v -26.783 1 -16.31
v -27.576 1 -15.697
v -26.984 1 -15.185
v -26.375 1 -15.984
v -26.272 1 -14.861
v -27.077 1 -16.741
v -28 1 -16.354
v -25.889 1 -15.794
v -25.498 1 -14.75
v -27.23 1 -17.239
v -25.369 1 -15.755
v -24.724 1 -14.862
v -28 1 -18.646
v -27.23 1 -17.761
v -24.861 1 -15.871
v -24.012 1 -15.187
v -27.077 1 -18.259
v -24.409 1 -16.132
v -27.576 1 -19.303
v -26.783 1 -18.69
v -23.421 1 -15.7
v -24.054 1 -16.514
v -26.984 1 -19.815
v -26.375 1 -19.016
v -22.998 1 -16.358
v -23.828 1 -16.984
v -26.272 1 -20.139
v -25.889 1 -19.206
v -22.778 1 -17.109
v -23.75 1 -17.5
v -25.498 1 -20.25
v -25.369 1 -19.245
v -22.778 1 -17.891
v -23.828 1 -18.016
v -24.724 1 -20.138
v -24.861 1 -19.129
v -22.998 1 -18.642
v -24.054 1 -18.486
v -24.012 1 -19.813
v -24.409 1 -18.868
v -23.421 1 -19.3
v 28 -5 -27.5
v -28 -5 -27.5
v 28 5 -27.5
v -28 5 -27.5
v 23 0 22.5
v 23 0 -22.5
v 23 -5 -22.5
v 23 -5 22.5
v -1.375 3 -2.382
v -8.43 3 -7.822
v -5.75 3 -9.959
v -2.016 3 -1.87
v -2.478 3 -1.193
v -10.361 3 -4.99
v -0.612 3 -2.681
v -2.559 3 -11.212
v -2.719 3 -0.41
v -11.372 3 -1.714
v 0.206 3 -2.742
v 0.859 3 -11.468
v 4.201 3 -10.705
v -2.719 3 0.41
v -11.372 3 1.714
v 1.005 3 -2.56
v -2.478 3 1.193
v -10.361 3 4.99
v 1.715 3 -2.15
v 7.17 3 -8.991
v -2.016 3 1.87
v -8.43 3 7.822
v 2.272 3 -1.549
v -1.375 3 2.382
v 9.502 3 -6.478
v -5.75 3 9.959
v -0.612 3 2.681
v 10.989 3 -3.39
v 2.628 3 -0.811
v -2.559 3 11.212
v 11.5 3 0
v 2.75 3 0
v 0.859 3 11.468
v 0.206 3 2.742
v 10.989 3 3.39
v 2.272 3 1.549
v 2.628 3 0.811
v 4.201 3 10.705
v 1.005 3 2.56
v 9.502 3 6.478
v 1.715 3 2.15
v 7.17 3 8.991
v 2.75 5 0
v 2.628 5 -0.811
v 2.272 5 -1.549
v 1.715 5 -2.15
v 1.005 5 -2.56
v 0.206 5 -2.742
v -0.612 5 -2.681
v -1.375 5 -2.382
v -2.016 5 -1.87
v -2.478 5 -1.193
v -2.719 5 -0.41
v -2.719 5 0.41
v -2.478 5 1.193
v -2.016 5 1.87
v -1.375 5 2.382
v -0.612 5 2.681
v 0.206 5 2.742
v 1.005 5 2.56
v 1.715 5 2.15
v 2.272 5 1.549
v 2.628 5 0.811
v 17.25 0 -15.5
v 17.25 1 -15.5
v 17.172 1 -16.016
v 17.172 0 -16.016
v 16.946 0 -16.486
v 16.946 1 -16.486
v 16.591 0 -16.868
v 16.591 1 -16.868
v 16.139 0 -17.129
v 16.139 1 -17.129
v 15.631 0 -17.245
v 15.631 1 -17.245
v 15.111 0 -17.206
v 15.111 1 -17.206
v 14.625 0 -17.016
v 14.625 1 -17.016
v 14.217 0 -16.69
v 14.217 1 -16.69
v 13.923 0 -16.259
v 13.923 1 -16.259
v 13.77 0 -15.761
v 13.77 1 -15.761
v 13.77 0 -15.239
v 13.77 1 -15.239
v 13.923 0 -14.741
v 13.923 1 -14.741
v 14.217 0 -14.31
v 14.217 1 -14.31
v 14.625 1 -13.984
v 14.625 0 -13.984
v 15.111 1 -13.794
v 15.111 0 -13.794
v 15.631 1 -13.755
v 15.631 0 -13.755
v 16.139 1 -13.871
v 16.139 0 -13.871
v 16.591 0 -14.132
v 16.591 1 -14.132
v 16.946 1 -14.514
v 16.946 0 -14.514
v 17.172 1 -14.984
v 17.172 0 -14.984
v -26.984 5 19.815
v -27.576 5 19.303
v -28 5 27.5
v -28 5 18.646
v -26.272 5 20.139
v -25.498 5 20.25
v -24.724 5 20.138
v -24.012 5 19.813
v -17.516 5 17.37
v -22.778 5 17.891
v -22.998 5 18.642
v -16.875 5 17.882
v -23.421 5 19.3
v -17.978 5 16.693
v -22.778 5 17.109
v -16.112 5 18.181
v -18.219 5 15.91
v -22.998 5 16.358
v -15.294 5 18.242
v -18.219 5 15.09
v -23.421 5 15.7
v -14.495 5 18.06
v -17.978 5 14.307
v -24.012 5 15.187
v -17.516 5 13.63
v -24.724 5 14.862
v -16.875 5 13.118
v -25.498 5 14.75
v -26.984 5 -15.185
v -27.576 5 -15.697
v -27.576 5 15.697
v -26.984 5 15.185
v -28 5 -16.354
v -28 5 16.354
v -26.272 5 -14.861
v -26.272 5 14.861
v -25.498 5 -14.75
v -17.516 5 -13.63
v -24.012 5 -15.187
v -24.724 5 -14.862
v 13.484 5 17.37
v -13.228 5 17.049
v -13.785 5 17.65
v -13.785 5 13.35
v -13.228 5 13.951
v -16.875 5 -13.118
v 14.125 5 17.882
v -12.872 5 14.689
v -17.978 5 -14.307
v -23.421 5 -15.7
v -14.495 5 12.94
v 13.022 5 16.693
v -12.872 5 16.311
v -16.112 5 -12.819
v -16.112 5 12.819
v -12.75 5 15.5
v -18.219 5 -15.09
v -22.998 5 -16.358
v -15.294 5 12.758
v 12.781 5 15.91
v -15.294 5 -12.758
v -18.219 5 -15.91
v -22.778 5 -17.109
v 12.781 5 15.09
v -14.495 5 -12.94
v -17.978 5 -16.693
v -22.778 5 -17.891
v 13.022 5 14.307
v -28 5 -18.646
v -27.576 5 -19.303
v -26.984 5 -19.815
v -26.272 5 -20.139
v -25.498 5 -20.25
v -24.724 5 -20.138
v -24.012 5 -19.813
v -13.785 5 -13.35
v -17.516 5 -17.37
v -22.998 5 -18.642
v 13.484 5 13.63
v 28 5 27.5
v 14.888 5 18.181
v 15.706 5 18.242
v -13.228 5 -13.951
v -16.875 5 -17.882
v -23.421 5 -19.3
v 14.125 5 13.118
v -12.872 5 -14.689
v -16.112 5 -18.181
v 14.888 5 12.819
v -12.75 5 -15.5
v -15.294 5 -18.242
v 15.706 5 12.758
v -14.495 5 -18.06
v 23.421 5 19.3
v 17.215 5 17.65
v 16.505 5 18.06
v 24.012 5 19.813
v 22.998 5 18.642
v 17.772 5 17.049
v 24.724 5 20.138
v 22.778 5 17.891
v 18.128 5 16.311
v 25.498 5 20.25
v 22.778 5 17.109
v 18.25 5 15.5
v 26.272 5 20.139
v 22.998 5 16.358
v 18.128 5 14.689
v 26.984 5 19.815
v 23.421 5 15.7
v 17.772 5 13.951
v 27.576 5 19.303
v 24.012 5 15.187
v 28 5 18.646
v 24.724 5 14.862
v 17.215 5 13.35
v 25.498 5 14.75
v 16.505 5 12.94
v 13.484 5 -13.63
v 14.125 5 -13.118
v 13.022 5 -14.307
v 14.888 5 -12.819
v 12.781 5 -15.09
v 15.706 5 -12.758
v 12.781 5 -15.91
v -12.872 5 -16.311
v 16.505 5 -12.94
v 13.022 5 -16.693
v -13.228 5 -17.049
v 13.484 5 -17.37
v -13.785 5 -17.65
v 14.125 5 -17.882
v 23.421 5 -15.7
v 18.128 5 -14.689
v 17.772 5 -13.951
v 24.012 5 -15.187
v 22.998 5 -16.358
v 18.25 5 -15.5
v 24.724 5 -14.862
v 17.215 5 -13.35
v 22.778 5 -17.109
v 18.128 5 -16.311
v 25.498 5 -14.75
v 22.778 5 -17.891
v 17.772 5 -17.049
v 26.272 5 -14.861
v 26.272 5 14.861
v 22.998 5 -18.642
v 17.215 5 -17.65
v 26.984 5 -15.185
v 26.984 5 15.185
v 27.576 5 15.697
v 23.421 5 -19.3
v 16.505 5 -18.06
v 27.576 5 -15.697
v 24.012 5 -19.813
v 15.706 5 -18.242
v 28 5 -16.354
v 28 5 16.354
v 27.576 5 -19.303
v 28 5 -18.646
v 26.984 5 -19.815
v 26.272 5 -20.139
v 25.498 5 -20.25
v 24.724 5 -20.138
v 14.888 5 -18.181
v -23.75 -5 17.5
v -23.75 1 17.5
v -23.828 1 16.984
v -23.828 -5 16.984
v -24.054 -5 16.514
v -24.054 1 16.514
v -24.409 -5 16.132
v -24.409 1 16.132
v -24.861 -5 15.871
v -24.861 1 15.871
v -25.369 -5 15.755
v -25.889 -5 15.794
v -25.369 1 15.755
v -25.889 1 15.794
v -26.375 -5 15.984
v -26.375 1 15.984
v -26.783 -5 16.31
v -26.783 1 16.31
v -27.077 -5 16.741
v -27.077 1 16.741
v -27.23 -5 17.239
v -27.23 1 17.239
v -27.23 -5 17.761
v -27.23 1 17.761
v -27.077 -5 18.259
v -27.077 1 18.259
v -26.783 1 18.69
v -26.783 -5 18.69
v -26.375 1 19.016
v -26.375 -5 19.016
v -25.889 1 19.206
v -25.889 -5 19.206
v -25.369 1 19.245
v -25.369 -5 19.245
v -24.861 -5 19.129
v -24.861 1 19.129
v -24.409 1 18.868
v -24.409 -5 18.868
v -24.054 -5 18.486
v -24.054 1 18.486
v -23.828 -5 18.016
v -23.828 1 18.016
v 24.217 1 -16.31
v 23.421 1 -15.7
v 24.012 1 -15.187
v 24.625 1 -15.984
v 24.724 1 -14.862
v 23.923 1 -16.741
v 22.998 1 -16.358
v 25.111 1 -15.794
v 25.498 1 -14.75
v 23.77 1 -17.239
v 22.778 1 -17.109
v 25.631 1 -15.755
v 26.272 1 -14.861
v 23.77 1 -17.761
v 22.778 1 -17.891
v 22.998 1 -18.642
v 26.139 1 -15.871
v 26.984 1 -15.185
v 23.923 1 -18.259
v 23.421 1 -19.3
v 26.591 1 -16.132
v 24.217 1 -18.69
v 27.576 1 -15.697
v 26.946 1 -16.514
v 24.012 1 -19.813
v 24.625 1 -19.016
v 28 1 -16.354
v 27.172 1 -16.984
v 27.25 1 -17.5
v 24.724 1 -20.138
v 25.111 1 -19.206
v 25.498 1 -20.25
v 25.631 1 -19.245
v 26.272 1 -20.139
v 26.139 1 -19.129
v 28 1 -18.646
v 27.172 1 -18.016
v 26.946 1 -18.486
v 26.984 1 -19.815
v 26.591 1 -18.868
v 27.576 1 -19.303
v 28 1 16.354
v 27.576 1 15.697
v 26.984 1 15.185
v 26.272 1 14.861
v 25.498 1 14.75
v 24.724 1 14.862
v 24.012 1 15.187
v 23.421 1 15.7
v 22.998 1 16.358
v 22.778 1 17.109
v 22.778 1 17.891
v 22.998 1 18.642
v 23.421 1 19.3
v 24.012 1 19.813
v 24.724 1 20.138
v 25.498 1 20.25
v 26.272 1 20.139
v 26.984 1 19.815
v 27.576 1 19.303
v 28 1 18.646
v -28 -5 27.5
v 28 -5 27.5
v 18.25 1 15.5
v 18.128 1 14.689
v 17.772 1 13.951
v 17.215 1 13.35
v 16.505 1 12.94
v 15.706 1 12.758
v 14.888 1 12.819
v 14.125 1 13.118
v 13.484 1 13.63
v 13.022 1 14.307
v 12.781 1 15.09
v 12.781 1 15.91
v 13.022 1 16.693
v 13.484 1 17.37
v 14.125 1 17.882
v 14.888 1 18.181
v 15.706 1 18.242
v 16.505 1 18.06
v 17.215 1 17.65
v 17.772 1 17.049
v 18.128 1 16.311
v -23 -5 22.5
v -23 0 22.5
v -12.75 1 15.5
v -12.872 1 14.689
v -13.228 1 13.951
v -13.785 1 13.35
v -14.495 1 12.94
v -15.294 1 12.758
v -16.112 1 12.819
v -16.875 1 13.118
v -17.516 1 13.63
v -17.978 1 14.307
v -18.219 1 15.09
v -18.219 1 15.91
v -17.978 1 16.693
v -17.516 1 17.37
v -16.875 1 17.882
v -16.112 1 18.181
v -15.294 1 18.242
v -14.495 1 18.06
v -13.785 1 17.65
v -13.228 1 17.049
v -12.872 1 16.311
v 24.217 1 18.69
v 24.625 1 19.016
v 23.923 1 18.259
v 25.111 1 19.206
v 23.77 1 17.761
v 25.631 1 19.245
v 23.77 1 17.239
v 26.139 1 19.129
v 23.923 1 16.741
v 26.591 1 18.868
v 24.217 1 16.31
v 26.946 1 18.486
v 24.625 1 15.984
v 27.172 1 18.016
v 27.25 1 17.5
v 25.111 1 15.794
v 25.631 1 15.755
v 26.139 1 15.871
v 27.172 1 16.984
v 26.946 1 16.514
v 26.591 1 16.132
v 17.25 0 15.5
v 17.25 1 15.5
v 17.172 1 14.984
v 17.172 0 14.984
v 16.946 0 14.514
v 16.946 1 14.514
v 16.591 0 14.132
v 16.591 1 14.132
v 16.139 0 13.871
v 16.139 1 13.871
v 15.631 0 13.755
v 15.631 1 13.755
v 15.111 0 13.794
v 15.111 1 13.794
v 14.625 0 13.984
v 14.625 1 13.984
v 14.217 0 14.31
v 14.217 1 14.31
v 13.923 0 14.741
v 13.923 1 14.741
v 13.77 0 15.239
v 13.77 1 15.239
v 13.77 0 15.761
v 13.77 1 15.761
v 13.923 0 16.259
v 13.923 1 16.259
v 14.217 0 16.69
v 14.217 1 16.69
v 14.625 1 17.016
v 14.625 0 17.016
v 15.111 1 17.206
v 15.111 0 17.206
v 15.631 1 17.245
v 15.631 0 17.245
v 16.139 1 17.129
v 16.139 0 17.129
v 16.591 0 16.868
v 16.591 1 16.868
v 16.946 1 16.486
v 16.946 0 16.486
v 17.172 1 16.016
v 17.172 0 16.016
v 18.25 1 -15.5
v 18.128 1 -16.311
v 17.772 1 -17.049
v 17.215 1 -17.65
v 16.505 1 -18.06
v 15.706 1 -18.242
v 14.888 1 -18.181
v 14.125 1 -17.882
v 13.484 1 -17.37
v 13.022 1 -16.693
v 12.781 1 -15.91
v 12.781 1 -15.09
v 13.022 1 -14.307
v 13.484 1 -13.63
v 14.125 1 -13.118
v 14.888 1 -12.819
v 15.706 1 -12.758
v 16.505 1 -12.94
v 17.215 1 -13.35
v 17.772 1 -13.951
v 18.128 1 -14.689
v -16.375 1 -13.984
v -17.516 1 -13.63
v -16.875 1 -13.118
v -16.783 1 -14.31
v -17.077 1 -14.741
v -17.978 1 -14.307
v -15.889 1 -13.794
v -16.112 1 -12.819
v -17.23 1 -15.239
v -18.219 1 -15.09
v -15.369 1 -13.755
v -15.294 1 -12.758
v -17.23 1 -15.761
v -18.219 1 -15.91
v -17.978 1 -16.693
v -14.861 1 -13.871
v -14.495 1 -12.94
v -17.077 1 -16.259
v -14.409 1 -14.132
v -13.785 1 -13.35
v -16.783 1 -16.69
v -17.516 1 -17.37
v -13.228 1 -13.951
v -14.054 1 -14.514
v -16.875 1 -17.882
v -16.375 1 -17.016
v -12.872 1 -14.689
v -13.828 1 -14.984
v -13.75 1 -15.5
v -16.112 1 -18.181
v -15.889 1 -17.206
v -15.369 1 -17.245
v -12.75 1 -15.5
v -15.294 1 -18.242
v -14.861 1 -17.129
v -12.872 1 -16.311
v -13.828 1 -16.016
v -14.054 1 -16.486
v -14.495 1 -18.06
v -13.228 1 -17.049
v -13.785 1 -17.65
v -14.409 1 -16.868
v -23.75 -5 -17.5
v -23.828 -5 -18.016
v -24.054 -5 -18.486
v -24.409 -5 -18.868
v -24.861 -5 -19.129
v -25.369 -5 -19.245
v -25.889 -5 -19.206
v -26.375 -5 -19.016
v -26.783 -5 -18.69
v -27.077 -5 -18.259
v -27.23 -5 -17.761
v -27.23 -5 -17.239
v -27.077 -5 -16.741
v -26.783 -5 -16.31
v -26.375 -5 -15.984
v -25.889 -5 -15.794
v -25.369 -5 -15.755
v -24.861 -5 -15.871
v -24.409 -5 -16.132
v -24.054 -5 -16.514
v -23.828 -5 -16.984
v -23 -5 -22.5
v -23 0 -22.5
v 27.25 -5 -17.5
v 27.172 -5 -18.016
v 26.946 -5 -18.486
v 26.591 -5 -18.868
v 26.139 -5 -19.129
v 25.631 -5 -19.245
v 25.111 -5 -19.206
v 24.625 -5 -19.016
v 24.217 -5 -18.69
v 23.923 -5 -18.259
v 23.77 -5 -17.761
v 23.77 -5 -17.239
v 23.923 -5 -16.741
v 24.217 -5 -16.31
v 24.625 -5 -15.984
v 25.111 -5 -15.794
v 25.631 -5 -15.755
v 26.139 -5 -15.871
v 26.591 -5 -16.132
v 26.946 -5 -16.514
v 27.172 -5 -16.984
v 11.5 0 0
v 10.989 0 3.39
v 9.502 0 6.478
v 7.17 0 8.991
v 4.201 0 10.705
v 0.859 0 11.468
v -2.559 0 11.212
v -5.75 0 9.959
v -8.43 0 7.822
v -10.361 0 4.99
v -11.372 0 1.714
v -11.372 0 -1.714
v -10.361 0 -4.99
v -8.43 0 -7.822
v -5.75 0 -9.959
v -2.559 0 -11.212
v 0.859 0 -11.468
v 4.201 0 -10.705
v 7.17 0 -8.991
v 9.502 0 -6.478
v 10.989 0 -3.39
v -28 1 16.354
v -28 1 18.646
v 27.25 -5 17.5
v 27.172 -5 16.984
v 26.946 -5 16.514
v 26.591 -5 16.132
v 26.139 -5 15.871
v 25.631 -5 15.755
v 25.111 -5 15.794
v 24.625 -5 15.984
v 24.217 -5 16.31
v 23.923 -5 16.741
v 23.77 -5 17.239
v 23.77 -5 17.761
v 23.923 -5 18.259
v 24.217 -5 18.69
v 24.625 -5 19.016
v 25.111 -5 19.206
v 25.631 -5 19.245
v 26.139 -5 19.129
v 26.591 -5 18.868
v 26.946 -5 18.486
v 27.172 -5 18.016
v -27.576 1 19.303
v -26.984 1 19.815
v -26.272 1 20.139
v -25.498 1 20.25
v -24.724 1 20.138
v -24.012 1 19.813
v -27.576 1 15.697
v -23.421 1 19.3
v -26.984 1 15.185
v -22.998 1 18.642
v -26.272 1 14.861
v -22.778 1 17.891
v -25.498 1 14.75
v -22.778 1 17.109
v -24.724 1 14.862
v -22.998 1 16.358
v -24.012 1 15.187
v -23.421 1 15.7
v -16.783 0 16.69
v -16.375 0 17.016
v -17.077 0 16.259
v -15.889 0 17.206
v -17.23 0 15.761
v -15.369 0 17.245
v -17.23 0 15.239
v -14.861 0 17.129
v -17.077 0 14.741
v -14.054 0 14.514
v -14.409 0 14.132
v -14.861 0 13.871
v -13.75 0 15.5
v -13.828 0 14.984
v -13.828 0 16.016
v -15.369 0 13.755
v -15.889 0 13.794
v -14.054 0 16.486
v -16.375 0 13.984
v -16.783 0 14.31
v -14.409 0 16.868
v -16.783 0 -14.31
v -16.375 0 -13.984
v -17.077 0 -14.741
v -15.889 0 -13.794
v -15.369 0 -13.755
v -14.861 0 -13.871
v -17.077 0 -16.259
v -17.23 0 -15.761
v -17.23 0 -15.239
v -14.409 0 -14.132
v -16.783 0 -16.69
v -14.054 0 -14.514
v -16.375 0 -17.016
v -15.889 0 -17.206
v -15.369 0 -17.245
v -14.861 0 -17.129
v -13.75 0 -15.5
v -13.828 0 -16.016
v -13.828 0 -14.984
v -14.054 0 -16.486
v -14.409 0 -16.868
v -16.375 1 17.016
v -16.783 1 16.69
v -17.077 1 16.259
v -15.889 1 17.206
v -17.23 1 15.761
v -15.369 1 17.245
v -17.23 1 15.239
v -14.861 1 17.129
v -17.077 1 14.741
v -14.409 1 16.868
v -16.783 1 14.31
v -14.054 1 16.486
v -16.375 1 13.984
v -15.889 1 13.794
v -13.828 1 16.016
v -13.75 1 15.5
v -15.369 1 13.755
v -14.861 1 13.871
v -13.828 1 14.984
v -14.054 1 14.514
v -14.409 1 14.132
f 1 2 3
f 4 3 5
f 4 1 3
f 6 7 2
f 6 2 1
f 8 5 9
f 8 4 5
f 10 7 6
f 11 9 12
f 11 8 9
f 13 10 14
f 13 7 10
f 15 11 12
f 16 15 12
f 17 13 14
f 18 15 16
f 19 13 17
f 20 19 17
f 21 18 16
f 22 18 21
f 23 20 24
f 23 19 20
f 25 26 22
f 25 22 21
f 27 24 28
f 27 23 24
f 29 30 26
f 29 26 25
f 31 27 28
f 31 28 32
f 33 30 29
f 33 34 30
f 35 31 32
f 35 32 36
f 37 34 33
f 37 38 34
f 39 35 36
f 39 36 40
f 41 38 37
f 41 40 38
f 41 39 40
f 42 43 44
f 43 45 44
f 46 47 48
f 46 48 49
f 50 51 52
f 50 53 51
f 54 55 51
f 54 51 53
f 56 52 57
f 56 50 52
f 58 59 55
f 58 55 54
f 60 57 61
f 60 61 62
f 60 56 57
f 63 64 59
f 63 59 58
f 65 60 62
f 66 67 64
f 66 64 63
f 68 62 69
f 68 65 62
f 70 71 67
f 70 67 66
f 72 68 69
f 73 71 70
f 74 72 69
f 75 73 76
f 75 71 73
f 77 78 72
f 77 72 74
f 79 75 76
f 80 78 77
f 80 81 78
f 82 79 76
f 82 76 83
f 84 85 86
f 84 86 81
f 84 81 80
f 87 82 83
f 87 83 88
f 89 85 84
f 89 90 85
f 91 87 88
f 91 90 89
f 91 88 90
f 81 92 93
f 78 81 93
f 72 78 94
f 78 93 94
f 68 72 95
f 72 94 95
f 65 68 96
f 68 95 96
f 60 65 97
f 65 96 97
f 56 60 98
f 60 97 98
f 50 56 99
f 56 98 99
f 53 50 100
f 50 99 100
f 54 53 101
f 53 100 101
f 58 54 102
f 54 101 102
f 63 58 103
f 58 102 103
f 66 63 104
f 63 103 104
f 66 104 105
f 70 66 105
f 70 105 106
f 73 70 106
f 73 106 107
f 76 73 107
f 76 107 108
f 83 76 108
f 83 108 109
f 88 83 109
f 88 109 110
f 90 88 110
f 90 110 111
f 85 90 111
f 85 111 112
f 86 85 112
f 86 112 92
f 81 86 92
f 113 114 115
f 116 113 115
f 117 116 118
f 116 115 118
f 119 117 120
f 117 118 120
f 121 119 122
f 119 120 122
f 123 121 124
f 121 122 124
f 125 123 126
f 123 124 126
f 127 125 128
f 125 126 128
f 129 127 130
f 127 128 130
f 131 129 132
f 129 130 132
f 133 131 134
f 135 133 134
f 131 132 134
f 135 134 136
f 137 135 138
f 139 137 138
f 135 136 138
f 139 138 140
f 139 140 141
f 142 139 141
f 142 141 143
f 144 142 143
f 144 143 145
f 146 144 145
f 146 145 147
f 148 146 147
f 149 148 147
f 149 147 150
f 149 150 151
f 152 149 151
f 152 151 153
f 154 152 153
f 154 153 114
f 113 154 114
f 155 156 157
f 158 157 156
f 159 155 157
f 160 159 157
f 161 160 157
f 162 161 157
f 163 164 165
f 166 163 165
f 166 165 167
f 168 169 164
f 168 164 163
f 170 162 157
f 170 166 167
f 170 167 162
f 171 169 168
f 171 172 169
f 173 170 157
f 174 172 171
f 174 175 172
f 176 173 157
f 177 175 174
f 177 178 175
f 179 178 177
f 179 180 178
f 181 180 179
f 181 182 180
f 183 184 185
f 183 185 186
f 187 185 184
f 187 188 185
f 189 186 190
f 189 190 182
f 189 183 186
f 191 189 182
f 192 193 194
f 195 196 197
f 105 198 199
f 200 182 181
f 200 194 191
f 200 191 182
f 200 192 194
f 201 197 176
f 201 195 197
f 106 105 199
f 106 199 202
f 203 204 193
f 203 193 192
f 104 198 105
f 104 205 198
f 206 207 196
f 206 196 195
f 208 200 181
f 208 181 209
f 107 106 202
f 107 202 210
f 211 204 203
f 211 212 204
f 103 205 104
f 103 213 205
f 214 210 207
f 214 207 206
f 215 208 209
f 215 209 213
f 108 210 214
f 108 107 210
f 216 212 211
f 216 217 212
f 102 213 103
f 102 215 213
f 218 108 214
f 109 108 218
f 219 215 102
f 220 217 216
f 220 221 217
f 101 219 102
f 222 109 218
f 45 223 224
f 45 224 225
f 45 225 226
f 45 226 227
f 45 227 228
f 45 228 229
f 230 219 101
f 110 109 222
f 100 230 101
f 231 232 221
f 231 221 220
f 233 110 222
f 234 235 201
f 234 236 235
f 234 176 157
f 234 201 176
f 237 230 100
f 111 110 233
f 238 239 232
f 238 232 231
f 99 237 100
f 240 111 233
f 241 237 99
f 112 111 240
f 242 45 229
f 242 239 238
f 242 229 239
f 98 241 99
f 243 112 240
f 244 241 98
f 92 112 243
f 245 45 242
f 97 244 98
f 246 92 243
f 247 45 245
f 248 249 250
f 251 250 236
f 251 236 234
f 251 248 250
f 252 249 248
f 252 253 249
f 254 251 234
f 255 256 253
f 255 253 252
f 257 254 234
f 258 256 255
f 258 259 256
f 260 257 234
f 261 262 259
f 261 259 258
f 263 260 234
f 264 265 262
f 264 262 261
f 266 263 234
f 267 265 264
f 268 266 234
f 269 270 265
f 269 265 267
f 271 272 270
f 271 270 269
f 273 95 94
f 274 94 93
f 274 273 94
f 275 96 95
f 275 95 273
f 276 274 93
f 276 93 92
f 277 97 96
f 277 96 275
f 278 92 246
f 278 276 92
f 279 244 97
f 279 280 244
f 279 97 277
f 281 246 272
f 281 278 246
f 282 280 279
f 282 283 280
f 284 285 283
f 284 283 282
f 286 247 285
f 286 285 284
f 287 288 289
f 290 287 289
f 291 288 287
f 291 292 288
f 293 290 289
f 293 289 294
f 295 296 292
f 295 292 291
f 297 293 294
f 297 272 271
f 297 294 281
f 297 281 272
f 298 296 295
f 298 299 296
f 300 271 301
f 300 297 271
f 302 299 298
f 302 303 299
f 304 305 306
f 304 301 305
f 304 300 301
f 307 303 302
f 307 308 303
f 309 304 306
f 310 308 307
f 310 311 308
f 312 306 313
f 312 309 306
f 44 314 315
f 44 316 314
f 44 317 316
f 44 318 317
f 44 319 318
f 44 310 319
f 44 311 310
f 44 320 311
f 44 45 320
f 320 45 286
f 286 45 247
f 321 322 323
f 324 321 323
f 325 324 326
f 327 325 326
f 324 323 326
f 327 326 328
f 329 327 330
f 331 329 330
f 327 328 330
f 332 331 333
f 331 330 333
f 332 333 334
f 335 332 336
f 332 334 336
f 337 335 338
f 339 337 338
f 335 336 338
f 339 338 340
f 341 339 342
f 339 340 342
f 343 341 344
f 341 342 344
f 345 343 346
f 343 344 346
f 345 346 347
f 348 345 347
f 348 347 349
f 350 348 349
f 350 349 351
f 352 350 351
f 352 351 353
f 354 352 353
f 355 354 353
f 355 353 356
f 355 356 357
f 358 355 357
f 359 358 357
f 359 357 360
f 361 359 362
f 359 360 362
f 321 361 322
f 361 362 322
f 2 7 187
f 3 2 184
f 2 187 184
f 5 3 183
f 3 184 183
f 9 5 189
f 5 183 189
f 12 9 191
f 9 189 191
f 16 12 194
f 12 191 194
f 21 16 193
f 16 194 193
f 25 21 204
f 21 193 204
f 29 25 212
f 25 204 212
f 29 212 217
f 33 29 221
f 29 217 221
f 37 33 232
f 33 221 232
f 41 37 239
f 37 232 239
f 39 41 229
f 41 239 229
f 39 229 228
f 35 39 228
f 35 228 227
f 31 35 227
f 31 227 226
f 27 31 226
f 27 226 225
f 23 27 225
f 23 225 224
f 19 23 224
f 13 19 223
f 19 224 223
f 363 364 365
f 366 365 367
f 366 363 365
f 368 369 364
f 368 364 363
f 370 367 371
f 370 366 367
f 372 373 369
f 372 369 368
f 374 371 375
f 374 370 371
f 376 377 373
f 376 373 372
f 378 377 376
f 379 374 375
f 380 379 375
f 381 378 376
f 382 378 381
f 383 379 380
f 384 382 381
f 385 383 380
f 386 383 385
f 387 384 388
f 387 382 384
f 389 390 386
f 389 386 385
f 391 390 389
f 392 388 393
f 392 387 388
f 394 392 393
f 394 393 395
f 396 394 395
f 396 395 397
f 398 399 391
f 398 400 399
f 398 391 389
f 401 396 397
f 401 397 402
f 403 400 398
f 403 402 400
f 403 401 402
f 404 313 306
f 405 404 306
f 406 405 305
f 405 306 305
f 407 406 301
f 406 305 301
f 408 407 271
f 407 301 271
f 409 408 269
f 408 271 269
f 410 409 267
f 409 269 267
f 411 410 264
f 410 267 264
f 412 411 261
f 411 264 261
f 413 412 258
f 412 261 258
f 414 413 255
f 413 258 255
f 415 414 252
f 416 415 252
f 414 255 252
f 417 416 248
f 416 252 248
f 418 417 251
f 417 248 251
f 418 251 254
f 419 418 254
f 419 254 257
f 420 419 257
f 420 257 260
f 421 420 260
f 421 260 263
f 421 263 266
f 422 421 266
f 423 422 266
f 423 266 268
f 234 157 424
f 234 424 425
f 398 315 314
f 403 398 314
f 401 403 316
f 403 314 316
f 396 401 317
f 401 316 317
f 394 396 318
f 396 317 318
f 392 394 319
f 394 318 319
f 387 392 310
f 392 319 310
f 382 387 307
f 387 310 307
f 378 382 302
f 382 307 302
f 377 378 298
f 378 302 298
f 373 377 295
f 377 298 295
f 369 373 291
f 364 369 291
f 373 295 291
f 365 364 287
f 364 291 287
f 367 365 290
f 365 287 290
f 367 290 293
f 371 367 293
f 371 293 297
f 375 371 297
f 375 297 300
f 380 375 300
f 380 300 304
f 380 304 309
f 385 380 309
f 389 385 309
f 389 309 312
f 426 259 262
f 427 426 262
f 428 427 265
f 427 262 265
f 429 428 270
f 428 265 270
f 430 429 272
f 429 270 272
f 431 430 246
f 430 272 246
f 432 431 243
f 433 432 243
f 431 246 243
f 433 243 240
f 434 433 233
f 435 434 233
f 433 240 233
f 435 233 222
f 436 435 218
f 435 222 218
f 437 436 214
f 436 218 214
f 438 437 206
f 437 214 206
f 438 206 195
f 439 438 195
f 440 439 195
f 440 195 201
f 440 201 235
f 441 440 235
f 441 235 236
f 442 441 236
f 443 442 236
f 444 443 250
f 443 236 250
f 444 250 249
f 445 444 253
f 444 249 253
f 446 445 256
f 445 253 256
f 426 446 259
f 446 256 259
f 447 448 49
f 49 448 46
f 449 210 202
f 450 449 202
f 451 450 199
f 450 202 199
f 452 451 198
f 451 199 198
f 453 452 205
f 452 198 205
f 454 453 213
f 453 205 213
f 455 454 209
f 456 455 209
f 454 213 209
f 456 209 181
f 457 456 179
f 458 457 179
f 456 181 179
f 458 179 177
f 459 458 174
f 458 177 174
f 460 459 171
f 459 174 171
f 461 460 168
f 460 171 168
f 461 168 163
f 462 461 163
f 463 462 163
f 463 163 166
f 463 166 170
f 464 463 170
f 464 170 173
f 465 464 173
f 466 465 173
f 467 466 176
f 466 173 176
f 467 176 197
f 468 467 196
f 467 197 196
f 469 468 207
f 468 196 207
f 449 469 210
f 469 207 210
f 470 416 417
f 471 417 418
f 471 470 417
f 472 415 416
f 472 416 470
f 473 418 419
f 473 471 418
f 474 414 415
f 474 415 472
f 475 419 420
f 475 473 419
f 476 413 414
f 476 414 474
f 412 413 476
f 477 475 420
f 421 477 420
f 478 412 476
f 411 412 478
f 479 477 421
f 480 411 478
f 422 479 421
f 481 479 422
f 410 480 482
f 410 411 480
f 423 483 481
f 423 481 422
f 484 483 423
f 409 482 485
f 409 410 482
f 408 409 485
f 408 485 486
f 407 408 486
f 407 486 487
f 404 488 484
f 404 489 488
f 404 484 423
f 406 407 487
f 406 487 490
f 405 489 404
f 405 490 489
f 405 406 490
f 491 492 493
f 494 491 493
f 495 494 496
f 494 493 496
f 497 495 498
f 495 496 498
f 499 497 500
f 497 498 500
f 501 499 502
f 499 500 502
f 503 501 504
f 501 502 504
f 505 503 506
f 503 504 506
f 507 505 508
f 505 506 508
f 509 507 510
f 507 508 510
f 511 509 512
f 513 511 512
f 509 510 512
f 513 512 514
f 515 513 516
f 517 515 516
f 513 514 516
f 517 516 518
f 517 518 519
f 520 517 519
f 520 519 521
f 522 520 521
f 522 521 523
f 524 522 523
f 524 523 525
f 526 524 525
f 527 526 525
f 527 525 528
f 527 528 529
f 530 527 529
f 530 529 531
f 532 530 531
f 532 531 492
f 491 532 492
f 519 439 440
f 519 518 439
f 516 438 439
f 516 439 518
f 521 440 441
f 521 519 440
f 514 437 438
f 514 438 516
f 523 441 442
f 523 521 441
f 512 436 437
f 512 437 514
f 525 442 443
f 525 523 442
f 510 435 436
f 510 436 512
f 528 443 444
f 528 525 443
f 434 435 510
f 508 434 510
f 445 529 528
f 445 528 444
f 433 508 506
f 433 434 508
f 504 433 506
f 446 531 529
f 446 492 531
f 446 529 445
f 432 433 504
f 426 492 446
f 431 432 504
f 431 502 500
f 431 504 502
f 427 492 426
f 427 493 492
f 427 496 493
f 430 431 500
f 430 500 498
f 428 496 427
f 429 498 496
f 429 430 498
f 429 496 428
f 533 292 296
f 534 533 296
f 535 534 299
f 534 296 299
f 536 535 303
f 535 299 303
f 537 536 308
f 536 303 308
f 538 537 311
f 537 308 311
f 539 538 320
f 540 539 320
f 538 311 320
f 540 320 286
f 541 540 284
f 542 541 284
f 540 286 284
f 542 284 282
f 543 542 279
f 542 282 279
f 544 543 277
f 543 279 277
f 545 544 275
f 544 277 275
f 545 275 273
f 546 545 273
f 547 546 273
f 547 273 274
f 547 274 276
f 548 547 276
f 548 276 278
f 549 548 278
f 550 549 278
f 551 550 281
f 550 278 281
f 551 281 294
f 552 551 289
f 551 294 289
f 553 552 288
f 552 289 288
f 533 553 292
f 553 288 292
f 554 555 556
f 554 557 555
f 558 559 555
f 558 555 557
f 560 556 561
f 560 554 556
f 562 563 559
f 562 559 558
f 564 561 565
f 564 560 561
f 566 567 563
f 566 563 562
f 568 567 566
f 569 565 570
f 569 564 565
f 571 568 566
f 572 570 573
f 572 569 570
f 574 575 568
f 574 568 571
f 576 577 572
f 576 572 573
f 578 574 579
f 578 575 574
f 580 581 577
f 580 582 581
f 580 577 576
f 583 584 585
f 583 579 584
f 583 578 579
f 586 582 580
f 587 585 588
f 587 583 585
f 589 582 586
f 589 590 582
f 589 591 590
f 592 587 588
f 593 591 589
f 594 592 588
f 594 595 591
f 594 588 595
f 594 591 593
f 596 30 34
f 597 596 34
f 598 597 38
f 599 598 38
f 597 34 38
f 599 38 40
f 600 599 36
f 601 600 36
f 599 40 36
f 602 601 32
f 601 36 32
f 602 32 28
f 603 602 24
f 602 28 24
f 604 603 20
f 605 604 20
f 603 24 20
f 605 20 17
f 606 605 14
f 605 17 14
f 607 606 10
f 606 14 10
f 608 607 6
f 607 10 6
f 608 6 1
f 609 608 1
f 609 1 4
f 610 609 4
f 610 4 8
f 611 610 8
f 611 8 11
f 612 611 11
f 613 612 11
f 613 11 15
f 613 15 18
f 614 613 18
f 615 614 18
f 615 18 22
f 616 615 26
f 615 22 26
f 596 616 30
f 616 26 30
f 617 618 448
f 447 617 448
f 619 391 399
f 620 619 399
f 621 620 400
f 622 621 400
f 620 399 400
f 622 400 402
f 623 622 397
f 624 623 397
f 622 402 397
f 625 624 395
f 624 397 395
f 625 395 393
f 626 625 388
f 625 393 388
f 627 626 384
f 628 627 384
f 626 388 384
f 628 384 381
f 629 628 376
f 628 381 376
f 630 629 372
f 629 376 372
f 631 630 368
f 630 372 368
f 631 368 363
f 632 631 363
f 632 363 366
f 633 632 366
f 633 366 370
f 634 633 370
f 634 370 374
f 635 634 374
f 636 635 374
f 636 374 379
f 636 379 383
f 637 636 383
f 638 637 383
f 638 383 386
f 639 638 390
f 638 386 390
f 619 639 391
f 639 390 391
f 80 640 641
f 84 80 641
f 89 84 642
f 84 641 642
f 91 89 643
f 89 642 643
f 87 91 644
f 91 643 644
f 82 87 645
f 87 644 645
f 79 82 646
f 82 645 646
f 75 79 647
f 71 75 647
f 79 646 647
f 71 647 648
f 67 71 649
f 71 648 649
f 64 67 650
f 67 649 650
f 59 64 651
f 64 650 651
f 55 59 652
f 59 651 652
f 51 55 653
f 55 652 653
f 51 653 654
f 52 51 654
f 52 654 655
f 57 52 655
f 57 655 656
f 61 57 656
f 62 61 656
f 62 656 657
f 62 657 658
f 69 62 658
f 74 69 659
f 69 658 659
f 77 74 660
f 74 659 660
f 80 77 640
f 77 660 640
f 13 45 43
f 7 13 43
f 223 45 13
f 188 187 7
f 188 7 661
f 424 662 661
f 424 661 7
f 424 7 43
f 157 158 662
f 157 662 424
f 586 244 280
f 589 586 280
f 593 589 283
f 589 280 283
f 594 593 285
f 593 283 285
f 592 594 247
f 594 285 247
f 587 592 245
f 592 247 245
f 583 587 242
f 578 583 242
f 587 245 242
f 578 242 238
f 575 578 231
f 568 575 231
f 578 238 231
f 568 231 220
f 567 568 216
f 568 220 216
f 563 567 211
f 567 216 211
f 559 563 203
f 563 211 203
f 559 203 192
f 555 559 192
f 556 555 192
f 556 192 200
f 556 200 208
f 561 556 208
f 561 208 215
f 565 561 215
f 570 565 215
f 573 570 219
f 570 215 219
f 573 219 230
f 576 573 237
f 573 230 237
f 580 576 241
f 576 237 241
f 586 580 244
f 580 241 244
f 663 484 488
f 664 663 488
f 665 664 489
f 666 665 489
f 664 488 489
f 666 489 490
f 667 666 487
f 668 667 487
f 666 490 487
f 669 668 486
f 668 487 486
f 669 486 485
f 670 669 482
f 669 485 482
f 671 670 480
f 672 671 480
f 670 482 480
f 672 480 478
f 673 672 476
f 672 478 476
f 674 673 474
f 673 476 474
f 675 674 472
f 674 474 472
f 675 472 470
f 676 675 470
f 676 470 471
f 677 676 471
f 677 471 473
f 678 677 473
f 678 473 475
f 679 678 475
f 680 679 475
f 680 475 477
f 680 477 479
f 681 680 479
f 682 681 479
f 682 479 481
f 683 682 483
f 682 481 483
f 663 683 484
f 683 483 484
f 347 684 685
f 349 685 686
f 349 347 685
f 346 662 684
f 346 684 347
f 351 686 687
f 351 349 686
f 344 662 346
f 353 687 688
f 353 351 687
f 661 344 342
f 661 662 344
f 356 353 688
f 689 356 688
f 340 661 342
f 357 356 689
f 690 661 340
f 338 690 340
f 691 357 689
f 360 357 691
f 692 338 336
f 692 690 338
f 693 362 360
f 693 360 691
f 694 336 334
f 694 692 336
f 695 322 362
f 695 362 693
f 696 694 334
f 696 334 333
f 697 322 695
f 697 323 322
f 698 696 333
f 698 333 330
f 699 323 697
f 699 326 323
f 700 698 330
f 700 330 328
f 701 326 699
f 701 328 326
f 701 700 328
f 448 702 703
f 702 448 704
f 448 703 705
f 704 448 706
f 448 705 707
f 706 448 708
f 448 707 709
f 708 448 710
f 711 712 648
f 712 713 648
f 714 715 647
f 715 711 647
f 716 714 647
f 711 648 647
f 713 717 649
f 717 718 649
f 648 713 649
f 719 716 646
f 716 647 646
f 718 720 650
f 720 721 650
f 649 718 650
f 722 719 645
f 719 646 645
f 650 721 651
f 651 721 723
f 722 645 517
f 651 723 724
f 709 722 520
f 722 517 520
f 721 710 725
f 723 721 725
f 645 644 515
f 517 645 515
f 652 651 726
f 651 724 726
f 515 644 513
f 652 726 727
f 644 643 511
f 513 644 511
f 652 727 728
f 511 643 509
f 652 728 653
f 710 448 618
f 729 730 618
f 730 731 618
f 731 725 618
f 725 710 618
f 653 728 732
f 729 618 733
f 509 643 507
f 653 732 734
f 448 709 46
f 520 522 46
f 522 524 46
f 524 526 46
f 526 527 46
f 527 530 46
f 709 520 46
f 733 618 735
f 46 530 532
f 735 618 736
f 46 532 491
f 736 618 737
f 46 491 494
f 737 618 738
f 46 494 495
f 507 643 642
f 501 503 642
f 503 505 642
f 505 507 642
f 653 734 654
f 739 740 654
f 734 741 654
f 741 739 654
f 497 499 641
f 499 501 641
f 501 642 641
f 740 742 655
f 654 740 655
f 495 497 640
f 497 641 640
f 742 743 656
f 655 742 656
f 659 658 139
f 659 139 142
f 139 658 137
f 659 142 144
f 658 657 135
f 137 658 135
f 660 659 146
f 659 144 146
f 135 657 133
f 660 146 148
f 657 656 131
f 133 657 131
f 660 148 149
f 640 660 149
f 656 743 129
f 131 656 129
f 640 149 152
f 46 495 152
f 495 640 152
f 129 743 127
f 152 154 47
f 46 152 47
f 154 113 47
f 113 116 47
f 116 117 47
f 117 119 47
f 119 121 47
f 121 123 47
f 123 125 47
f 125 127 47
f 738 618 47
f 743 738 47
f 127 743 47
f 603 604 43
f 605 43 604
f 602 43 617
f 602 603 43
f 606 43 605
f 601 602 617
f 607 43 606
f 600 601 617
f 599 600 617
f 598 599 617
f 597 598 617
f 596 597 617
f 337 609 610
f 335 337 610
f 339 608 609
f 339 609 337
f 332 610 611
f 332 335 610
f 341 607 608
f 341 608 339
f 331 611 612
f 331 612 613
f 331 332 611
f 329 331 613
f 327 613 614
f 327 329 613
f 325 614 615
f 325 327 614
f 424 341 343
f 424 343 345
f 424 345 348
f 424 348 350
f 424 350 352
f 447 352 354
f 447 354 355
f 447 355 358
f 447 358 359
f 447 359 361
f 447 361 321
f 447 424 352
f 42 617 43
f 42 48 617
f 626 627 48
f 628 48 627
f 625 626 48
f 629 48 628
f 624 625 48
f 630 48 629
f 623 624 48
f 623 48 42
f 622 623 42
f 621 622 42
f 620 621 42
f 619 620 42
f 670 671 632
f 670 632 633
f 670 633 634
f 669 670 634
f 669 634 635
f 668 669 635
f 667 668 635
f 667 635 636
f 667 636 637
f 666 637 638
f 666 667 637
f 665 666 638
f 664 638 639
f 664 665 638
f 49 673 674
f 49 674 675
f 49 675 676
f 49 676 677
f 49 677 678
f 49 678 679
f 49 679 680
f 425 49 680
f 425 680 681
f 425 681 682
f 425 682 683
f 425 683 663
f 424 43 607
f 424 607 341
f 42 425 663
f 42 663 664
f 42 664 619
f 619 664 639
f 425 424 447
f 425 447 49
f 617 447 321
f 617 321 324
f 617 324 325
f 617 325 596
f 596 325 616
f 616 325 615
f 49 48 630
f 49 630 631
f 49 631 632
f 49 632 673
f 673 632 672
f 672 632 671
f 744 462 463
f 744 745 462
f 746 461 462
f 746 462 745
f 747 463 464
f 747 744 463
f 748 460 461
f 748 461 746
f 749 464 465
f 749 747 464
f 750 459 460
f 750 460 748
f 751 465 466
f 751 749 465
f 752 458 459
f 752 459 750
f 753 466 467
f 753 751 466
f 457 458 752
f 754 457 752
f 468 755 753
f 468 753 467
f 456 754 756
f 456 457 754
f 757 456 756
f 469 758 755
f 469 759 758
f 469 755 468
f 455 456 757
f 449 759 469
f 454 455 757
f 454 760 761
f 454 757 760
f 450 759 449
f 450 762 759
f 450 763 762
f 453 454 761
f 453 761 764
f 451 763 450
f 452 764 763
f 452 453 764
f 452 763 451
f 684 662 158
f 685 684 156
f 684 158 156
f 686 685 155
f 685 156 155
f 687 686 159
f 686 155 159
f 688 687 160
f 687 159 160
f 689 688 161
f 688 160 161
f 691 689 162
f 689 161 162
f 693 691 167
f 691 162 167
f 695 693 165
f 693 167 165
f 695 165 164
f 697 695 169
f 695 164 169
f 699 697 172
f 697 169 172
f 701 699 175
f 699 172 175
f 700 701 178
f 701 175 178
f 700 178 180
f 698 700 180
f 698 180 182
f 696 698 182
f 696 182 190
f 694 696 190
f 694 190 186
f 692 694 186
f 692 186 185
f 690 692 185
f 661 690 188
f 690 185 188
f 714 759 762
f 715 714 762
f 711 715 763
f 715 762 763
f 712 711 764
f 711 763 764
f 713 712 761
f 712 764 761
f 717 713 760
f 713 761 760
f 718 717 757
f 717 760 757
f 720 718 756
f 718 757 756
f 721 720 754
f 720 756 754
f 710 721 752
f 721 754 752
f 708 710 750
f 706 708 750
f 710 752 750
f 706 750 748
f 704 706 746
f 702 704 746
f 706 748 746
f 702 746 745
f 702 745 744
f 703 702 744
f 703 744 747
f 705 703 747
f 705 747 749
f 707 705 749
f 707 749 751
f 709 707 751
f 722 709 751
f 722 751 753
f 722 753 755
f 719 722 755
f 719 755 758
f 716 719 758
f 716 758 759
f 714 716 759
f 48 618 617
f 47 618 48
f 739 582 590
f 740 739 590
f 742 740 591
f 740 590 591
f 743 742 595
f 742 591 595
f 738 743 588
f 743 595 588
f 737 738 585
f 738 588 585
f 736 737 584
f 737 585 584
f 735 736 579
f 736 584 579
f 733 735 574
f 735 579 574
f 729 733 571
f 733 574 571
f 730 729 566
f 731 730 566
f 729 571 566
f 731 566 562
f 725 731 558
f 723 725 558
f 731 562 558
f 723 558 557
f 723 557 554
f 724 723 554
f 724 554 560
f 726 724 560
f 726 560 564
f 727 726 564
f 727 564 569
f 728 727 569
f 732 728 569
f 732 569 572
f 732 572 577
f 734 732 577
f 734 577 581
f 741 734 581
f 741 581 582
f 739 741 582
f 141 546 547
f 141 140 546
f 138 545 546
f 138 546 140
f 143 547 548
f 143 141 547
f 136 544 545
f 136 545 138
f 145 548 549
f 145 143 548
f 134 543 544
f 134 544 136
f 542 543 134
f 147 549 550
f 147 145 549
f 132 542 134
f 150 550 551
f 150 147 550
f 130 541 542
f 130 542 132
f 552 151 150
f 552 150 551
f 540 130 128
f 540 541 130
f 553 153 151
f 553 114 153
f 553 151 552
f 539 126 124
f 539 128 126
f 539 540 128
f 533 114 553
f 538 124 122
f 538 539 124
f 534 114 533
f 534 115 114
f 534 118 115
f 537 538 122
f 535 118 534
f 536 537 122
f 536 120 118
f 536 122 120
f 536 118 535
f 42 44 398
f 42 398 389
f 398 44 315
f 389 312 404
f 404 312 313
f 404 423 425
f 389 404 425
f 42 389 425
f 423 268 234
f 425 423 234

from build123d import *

# Parameters (mm, degrees)
SKETCH2_W           = 56
SKETCH2_H           = 55
BOSS_EXTRUDE1_DEPTH = 5
SKETCH4_R           = 11.5
CUT_EXTRUDE1_DEPTH  = 3
SKETCH5_R           = 1.75
CUT_EXTRUDE3_DEPTH  = 54
SKETCH6_W           = 56
SKETCH6_H           = 55
SKETCH6_W_2         = 46
SKETCH6_H_2         = 45
BOSS_EXTRUDE2_DEPTH = 5
SKETCH3_R           = 2.75
SKETCH3_R_2         = 1.75
CUT_EXTRUDE2_DEPTH  = 12
SKETCH5_2_R         = 1.75
CUT_EXTRUDE4_DEPTH  = 33
SKETCH7_R           = 2.75
CUT_EXTRUDE5_DEPTH  = 4


with BuildPart() as part:
    # Sketch2 → Boss-Extrude1 (new body)
    with BuildSketch(Plane(origin=(0, 0, 0), x_dir=(1, 0, 0), z_dir=(0, 1, 0))):
        Rectangle(SKETCH2_W, SKETCH2_H)
    extrude(amount=BOSS_EXTRUDE1_DEPTH)

    # Sketch4 → Cut-Extrude1 (cut)
    with BuildSketch(Plane.XZ):
        Circle(SKETCH4_R)
    extrude(amount=-CUT_EXTRUDE1_DEPTH, mode=Mode.SUBTRACT)

    # Sketch5 → Cut-Extrude3 (cut)
    with BuildSketch(Plane(origin=(0, 5, 0), x_dir=(1, 0, 0), z_dir=(0, 1, 0))):
        with Locations((-25.5, 17.5)):
            Circle(SKETCH5_R)
        with Locations((25.5, -17.5)):
            Circle(SKETCH5_R)
        with Locations((-25.5, -17.5)):
            Circle(SKETCH5_R)
        with Locations((25.5, 17.5)):
            Circle(SKETCH5_R)
    extrude(amount=-CUT_EXTRUDE3_DEPTH, mode=Mode.SUBTRACT)

    # Sketch6 → Boss-Extrude2 (add)
    with BuildSketch(Plane.XZ):
        Rectangle(SKETCH6_W, SKETCH6_H)
        Rectangle(SKETCH6_W_2, SKETCH6_H_2, mode=Mode.SUBTRACT)
    extrude(amount=BOSS_EXTRUDE2_DEPTH)

    # Sketch3 → Cut-Extrude2 (cut)
    with BuildSketch(Plane(origin=(0, 5, 0), x_dir=(1, 0, 0), z_dir=(0, 1, 0))):
        Circle(SKETCH3_R)
        with Locations((-15.5, 15.5)):
            Circle(SKETCH3_R_2)
        with Locations((15.5, 15.5)):
            Circle(SKETCH3_R_2)
        with Locations((15.5, -15.5)):
            Circle(SKETCH3_R_2)
        with Locations((-15.5, -15.5)):
            Circle(SKETCH3_R_2)
    extrude(amount=-CUT_EXTRUDE2_DEPTH, mode=Mode.SUBTRACT)

    # Sketch5<2> → Cut-Extrude4 (cut)
    with BuildSketch(Plane(origin=(0, 5, 0), x_dir=(1, 0, 0), z_dir=(0, 1, 0))):
        with Locations((-25.5, 17.5)):
            Circle(SKETCH5_2_R)
        with Locations((25.5, -17.5)):
            Circle(SKETCH5_2_R)
        with Locations((-25.5, -17.5)):
            Circle(SKETCH5_2_R)
        with Locations((25.5, 17.5)):
            Circle(SKETCH5_2_R)
    extrude(amount=-CUT_EXTRUDE4_DEPTH, mode=Mode.SUBTRACT)

    # Sketch7 → Cut-Extrude5 (cut)
    with BuildSketch(Plane(origin=(0, 5, 0), x_dir=(1, 0, 0), z_dir=(0, 1, 0))):
        with Locations((-15.5, 15.5)):
            Circle(SKETCH7_R)
        with Locations((15.5, 15.5)):
            Circle(SKETCH7_R)
        with Locations((15.5, -15.5)):
            Circle(SKETCH7_R)
        with Locations((-15.5, -15.5)):
            Circle(SKETCH7_R)
        with Locations((-25.5, 17.5)):
            Circle(SKETCH7_R)
        with Locations((-25.5, -17.5)):
            Circle(SKETCH7_R)
        with Locations((25.5, 17.5)):
            Circle(SKETCH7_R)
        with Locations((25.5, -17.5)):
            Circle(SKETCH7_R)
    extrude(amount=-CUT_EXTRUDE5_DEPTH, mode=Mode.SUBTRACT)


solid = part.part
